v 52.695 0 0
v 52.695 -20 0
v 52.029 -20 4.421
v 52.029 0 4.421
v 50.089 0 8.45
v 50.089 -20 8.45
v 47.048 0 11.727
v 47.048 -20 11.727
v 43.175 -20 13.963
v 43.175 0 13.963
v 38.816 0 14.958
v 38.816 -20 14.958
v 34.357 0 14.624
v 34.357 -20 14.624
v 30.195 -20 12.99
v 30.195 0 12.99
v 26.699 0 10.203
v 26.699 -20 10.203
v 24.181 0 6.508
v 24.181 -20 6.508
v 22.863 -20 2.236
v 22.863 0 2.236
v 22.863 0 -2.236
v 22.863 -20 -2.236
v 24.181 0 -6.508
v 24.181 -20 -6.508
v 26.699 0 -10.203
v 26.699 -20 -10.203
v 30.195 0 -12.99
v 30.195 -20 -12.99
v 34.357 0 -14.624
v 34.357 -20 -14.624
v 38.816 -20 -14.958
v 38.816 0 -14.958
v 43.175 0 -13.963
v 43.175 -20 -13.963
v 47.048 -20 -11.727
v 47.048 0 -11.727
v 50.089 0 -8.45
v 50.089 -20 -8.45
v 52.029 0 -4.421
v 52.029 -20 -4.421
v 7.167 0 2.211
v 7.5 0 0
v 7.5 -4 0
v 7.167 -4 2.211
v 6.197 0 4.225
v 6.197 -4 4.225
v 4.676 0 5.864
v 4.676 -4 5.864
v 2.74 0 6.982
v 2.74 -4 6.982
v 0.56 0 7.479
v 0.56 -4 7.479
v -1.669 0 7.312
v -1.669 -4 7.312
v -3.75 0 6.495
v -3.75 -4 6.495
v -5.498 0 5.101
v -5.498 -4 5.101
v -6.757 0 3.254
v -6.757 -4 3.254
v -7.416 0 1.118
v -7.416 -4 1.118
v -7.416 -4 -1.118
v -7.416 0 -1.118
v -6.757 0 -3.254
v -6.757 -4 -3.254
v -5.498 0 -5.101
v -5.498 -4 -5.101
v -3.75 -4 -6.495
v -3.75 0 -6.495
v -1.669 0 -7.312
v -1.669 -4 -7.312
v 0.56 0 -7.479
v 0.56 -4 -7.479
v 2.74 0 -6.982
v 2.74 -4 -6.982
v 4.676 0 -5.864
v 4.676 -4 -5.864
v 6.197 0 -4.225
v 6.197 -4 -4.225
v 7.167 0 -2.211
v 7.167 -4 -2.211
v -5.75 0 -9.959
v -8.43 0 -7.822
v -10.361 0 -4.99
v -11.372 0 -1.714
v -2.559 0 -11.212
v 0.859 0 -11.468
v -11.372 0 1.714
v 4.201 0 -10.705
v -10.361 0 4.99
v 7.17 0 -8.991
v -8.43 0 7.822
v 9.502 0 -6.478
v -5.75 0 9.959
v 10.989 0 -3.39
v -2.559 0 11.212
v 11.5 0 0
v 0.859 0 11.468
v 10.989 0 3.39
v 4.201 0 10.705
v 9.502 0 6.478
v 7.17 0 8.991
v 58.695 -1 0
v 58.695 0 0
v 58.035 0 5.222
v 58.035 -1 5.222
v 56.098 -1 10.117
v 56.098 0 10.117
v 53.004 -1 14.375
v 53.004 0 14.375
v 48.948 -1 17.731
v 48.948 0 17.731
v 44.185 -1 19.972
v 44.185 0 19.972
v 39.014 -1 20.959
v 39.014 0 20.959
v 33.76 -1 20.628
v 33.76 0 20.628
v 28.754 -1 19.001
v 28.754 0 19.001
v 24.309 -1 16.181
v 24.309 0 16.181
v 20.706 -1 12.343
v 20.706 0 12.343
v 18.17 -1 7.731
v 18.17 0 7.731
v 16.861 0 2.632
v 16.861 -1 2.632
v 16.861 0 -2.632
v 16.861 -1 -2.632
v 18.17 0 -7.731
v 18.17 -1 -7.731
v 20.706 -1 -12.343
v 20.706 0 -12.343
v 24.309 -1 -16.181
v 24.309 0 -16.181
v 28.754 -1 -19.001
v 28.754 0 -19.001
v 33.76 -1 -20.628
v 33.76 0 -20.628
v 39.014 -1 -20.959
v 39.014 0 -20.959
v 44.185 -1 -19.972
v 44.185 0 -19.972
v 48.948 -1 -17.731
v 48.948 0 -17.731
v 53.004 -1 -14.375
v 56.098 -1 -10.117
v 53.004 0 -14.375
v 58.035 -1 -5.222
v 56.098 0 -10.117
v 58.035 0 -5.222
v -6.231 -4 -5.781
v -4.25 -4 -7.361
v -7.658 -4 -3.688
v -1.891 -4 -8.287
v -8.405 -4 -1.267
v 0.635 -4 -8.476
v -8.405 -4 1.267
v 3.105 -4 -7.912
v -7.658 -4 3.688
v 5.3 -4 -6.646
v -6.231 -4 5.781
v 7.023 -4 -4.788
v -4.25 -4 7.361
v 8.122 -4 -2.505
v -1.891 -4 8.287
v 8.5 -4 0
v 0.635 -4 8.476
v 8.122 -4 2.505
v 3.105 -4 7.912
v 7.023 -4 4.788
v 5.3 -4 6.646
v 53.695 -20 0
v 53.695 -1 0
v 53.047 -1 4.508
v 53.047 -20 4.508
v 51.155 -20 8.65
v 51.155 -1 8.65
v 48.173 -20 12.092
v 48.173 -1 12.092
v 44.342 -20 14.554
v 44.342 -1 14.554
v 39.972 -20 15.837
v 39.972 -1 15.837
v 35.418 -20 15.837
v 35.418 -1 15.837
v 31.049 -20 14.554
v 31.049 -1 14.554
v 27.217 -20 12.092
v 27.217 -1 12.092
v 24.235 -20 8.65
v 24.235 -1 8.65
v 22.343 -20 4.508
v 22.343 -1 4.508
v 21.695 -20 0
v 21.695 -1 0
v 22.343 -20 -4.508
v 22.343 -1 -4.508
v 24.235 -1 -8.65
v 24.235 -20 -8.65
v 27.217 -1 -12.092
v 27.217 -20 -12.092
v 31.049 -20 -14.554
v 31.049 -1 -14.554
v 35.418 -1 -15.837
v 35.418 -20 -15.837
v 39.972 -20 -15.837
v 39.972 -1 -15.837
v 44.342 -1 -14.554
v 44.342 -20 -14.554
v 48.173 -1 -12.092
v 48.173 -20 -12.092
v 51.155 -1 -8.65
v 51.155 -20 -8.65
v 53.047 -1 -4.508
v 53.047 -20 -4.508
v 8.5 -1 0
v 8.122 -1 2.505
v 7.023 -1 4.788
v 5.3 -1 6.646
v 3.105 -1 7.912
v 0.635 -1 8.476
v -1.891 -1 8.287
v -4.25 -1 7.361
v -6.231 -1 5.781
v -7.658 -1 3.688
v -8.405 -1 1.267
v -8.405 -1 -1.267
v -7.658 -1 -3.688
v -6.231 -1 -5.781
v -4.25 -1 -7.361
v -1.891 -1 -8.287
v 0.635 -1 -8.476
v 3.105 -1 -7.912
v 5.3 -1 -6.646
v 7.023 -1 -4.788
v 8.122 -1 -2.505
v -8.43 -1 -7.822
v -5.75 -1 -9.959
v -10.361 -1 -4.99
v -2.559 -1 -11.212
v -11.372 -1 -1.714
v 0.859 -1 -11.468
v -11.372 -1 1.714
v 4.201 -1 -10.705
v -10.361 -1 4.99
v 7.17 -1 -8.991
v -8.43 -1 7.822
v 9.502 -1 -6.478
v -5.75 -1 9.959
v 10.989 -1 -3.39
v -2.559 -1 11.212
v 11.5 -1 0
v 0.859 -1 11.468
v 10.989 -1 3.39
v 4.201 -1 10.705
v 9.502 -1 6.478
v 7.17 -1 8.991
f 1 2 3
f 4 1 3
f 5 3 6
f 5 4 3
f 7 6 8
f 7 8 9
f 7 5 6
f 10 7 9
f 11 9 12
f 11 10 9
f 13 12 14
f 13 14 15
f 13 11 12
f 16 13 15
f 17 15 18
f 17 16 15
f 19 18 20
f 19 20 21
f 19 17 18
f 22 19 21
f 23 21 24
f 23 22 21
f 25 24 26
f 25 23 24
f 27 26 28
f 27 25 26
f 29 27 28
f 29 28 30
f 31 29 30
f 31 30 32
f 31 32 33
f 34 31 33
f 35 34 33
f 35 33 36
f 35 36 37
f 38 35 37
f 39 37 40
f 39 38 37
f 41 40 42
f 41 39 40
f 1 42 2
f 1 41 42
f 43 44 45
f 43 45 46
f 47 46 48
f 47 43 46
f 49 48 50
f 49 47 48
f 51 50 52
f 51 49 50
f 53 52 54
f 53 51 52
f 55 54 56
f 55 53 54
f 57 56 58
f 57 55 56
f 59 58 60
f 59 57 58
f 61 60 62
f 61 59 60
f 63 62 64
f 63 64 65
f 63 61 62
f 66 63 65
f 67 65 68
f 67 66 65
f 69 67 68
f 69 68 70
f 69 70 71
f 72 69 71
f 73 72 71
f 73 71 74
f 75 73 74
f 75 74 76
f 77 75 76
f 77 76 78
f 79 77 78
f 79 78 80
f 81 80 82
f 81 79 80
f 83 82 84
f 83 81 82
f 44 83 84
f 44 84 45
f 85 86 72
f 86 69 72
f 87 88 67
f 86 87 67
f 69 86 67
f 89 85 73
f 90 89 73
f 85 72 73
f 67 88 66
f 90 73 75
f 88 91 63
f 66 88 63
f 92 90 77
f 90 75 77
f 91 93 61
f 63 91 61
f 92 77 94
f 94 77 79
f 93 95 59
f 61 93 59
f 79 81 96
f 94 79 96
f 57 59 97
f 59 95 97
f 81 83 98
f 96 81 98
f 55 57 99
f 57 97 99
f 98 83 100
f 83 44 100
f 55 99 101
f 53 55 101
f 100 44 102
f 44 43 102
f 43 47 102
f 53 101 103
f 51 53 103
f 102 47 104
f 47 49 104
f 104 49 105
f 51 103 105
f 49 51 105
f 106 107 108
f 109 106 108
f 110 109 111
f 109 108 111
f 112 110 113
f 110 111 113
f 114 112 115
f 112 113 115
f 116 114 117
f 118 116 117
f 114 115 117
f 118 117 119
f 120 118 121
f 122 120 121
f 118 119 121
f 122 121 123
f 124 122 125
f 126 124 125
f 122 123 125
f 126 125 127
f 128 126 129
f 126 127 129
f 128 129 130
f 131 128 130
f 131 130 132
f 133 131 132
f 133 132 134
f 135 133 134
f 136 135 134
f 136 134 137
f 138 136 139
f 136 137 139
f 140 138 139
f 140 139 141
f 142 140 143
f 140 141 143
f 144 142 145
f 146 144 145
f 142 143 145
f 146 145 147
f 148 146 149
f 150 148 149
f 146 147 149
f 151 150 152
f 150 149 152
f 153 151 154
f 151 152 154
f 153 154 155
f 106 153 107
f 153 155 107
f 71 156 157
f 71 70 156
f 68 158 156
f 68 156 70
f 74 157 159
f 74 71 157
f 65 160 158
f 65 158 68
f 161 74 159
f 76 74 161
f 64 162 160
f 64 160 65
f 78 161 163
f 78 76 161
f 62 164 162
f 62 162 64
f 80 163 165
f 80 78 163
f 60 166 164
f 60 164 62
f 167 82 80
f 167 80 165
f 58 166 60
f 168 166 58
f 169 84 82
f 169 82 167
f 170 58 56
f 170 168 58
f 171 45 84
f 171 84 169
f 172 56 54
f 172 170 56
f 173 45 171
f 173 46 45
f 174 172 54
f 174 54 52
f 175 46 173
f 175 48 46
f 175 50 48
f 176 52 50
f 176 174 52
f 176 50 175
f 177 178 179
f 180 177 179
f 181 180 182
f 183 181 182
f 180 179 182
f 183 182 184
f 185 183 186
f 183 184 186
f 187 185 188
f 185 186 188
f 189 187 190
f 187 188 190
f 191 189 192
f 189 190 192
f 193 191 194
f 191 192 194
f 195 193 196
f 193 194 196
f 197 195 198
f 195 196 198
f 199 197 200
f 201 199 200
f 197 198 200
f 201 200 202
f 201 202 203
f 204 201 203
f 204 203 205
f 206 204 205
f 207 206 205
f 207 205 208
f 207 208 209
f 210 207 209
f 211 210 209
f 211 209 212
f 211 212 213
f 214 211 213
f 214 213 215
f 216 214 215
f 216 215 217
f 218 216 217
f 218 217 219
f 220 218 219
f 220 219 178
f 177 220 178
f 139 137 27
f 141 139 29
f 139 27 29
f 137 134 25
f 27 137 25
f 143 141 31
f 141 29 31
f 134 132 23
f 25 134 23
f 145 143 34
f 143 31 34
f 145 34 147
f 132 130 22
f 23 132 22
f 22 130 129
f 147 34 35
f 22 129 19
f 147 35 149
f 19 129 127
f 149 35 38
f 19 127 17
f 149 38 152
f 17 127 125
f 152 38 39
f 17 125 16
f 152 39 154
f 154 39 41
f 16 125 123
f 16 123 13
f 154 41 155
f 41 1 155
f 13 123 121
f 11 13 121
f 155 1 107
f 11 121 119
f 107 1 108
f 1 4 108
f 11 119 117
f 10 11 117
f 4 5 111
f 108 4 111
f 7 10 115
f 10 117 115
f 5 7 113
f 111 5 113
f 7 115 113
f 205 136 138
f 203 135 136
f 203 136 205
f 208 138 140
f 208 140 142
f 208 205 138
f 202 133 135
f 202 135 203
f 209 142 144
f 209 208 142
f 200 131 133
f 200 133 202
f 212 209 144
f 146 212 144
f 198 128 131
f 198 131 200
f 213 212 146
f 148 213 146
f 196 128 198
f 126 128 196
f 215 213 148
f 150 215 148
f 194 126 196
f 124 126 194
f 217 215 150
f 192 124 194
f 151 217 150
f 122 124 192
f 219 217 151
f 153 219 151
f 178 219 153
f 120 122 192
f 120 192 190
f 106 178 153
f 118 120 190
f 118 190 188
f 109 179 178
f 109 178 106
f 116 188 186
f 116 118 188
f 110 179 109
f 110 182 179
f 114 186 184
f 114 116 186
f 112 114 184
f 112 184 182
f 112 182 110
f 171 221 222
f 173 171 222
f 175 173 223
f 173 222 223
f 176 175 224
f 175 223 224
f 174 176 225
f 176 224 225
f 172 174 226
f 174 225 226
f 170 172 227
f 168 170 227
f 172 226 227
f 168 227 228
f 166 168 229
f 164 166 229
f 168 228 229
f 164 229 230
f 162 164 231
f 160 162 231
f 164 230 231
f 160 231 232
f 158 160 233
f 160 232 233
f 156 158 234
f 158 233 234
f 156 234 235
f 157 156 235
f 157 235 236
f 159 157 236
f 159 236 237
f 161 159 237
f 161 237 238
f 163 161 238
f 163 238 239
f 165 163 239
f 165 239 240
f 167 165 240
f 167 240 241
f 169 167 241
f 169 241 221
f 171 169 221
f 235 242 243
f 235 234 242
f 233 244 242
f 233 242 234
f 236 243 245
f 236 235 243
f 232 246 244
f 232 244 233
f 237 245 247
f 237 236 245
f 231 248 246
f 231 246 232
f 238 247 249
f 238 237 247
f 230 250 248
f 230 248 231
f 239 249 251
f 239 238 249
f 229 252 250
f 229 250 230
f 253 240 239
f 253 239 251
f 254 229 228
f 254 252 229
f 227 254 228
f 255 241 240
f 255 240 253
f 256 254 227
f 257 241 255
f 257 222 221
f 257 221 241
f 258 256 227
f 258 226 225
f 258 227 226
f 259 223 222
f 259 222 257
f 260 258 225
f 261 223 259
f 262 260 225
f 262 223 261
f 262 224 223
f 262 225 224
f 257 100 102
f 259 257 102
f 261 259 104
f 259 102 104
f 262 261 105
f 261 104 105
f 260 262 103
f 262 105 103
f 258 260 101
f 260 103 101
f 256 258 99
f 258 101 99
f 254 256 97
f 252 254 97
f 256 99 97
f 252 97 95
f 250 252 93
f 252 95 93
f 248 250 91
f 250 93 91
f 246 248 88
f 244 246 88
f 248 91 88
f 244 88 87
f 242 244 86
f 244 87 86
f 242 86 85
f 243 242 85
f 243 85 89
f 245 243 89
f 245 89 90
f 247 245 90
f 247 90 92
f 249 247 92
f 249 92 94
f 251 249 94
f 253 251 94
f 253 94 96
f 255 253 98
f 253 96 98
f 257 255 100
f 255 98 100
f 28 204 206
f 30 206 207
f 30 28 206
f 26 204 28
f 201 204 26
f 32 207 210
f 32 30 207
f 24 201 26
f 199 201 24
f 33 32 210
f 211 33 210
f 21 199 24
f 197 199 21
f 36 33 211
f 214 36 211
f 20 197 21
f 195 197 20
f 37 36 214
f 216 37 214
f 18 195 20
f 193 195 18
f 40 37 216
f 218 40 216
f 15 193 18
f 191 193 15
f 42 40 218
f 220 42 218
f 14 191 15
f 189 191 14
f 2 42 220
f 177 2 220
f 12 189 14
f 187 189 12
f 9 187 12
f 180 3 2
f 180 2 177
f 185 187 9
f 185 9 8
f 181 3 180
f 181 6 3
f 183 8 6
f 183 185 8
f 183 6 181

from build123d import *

# Parameters (mm, degrees)
F0_R     = 8.5
F0_R_2   = 7.5
F1_DEPTH = 4
F2_R     = 16
F2_R_2   = 15
F3_DEPTH = 20
F2_R_3   = 21
F4_DEPTH = 1
F0_R_3   = 11.5
F5_DEPTH = 1


with BuildPart() as f1:
    # F0 (on Front) → F1 (new body)
    with BuildSketch(Plane.XZ):
        Circle(F0_R)
        Circle(F0_R_2, mode=Mode.SUBTRACT)
    extrude(amount=F1_DEPTH)

    # F0 (on Front) → F5 (join)
    with BuildSketch(Plane.XZ):
        Circle(F0_R_3)
        Circle(F0_R, mode=Mode.SUBTRACT)
    extrude(amount=F5_DEPTH)


with BuildPart() as f3:
    # F2 (on Front) → F3 (new body)
    with BuildSketch(Plane.XZ):
        with Locations((37.695205, 0)):
            Circle(F2_R)
        with Locations((37.695205, 0)):
            Circle(F2_R_2, mode=Mode.SUBTRACT)
    extrude(amount=F3_DEPTH)

    # F2 (on Front) → F4 (join)
    with BuildSketch(Plane.XZ):
        with Locations((37.695205, 0)):
            Circle(F2_R_3)
        with Locations((37.695205, 0)):
            Circle(F2_R, mode=Mode.SUBTRACT)
    extrude(amount=F4_DEPTH)


solid = Compound([f1.part, f3.part])
